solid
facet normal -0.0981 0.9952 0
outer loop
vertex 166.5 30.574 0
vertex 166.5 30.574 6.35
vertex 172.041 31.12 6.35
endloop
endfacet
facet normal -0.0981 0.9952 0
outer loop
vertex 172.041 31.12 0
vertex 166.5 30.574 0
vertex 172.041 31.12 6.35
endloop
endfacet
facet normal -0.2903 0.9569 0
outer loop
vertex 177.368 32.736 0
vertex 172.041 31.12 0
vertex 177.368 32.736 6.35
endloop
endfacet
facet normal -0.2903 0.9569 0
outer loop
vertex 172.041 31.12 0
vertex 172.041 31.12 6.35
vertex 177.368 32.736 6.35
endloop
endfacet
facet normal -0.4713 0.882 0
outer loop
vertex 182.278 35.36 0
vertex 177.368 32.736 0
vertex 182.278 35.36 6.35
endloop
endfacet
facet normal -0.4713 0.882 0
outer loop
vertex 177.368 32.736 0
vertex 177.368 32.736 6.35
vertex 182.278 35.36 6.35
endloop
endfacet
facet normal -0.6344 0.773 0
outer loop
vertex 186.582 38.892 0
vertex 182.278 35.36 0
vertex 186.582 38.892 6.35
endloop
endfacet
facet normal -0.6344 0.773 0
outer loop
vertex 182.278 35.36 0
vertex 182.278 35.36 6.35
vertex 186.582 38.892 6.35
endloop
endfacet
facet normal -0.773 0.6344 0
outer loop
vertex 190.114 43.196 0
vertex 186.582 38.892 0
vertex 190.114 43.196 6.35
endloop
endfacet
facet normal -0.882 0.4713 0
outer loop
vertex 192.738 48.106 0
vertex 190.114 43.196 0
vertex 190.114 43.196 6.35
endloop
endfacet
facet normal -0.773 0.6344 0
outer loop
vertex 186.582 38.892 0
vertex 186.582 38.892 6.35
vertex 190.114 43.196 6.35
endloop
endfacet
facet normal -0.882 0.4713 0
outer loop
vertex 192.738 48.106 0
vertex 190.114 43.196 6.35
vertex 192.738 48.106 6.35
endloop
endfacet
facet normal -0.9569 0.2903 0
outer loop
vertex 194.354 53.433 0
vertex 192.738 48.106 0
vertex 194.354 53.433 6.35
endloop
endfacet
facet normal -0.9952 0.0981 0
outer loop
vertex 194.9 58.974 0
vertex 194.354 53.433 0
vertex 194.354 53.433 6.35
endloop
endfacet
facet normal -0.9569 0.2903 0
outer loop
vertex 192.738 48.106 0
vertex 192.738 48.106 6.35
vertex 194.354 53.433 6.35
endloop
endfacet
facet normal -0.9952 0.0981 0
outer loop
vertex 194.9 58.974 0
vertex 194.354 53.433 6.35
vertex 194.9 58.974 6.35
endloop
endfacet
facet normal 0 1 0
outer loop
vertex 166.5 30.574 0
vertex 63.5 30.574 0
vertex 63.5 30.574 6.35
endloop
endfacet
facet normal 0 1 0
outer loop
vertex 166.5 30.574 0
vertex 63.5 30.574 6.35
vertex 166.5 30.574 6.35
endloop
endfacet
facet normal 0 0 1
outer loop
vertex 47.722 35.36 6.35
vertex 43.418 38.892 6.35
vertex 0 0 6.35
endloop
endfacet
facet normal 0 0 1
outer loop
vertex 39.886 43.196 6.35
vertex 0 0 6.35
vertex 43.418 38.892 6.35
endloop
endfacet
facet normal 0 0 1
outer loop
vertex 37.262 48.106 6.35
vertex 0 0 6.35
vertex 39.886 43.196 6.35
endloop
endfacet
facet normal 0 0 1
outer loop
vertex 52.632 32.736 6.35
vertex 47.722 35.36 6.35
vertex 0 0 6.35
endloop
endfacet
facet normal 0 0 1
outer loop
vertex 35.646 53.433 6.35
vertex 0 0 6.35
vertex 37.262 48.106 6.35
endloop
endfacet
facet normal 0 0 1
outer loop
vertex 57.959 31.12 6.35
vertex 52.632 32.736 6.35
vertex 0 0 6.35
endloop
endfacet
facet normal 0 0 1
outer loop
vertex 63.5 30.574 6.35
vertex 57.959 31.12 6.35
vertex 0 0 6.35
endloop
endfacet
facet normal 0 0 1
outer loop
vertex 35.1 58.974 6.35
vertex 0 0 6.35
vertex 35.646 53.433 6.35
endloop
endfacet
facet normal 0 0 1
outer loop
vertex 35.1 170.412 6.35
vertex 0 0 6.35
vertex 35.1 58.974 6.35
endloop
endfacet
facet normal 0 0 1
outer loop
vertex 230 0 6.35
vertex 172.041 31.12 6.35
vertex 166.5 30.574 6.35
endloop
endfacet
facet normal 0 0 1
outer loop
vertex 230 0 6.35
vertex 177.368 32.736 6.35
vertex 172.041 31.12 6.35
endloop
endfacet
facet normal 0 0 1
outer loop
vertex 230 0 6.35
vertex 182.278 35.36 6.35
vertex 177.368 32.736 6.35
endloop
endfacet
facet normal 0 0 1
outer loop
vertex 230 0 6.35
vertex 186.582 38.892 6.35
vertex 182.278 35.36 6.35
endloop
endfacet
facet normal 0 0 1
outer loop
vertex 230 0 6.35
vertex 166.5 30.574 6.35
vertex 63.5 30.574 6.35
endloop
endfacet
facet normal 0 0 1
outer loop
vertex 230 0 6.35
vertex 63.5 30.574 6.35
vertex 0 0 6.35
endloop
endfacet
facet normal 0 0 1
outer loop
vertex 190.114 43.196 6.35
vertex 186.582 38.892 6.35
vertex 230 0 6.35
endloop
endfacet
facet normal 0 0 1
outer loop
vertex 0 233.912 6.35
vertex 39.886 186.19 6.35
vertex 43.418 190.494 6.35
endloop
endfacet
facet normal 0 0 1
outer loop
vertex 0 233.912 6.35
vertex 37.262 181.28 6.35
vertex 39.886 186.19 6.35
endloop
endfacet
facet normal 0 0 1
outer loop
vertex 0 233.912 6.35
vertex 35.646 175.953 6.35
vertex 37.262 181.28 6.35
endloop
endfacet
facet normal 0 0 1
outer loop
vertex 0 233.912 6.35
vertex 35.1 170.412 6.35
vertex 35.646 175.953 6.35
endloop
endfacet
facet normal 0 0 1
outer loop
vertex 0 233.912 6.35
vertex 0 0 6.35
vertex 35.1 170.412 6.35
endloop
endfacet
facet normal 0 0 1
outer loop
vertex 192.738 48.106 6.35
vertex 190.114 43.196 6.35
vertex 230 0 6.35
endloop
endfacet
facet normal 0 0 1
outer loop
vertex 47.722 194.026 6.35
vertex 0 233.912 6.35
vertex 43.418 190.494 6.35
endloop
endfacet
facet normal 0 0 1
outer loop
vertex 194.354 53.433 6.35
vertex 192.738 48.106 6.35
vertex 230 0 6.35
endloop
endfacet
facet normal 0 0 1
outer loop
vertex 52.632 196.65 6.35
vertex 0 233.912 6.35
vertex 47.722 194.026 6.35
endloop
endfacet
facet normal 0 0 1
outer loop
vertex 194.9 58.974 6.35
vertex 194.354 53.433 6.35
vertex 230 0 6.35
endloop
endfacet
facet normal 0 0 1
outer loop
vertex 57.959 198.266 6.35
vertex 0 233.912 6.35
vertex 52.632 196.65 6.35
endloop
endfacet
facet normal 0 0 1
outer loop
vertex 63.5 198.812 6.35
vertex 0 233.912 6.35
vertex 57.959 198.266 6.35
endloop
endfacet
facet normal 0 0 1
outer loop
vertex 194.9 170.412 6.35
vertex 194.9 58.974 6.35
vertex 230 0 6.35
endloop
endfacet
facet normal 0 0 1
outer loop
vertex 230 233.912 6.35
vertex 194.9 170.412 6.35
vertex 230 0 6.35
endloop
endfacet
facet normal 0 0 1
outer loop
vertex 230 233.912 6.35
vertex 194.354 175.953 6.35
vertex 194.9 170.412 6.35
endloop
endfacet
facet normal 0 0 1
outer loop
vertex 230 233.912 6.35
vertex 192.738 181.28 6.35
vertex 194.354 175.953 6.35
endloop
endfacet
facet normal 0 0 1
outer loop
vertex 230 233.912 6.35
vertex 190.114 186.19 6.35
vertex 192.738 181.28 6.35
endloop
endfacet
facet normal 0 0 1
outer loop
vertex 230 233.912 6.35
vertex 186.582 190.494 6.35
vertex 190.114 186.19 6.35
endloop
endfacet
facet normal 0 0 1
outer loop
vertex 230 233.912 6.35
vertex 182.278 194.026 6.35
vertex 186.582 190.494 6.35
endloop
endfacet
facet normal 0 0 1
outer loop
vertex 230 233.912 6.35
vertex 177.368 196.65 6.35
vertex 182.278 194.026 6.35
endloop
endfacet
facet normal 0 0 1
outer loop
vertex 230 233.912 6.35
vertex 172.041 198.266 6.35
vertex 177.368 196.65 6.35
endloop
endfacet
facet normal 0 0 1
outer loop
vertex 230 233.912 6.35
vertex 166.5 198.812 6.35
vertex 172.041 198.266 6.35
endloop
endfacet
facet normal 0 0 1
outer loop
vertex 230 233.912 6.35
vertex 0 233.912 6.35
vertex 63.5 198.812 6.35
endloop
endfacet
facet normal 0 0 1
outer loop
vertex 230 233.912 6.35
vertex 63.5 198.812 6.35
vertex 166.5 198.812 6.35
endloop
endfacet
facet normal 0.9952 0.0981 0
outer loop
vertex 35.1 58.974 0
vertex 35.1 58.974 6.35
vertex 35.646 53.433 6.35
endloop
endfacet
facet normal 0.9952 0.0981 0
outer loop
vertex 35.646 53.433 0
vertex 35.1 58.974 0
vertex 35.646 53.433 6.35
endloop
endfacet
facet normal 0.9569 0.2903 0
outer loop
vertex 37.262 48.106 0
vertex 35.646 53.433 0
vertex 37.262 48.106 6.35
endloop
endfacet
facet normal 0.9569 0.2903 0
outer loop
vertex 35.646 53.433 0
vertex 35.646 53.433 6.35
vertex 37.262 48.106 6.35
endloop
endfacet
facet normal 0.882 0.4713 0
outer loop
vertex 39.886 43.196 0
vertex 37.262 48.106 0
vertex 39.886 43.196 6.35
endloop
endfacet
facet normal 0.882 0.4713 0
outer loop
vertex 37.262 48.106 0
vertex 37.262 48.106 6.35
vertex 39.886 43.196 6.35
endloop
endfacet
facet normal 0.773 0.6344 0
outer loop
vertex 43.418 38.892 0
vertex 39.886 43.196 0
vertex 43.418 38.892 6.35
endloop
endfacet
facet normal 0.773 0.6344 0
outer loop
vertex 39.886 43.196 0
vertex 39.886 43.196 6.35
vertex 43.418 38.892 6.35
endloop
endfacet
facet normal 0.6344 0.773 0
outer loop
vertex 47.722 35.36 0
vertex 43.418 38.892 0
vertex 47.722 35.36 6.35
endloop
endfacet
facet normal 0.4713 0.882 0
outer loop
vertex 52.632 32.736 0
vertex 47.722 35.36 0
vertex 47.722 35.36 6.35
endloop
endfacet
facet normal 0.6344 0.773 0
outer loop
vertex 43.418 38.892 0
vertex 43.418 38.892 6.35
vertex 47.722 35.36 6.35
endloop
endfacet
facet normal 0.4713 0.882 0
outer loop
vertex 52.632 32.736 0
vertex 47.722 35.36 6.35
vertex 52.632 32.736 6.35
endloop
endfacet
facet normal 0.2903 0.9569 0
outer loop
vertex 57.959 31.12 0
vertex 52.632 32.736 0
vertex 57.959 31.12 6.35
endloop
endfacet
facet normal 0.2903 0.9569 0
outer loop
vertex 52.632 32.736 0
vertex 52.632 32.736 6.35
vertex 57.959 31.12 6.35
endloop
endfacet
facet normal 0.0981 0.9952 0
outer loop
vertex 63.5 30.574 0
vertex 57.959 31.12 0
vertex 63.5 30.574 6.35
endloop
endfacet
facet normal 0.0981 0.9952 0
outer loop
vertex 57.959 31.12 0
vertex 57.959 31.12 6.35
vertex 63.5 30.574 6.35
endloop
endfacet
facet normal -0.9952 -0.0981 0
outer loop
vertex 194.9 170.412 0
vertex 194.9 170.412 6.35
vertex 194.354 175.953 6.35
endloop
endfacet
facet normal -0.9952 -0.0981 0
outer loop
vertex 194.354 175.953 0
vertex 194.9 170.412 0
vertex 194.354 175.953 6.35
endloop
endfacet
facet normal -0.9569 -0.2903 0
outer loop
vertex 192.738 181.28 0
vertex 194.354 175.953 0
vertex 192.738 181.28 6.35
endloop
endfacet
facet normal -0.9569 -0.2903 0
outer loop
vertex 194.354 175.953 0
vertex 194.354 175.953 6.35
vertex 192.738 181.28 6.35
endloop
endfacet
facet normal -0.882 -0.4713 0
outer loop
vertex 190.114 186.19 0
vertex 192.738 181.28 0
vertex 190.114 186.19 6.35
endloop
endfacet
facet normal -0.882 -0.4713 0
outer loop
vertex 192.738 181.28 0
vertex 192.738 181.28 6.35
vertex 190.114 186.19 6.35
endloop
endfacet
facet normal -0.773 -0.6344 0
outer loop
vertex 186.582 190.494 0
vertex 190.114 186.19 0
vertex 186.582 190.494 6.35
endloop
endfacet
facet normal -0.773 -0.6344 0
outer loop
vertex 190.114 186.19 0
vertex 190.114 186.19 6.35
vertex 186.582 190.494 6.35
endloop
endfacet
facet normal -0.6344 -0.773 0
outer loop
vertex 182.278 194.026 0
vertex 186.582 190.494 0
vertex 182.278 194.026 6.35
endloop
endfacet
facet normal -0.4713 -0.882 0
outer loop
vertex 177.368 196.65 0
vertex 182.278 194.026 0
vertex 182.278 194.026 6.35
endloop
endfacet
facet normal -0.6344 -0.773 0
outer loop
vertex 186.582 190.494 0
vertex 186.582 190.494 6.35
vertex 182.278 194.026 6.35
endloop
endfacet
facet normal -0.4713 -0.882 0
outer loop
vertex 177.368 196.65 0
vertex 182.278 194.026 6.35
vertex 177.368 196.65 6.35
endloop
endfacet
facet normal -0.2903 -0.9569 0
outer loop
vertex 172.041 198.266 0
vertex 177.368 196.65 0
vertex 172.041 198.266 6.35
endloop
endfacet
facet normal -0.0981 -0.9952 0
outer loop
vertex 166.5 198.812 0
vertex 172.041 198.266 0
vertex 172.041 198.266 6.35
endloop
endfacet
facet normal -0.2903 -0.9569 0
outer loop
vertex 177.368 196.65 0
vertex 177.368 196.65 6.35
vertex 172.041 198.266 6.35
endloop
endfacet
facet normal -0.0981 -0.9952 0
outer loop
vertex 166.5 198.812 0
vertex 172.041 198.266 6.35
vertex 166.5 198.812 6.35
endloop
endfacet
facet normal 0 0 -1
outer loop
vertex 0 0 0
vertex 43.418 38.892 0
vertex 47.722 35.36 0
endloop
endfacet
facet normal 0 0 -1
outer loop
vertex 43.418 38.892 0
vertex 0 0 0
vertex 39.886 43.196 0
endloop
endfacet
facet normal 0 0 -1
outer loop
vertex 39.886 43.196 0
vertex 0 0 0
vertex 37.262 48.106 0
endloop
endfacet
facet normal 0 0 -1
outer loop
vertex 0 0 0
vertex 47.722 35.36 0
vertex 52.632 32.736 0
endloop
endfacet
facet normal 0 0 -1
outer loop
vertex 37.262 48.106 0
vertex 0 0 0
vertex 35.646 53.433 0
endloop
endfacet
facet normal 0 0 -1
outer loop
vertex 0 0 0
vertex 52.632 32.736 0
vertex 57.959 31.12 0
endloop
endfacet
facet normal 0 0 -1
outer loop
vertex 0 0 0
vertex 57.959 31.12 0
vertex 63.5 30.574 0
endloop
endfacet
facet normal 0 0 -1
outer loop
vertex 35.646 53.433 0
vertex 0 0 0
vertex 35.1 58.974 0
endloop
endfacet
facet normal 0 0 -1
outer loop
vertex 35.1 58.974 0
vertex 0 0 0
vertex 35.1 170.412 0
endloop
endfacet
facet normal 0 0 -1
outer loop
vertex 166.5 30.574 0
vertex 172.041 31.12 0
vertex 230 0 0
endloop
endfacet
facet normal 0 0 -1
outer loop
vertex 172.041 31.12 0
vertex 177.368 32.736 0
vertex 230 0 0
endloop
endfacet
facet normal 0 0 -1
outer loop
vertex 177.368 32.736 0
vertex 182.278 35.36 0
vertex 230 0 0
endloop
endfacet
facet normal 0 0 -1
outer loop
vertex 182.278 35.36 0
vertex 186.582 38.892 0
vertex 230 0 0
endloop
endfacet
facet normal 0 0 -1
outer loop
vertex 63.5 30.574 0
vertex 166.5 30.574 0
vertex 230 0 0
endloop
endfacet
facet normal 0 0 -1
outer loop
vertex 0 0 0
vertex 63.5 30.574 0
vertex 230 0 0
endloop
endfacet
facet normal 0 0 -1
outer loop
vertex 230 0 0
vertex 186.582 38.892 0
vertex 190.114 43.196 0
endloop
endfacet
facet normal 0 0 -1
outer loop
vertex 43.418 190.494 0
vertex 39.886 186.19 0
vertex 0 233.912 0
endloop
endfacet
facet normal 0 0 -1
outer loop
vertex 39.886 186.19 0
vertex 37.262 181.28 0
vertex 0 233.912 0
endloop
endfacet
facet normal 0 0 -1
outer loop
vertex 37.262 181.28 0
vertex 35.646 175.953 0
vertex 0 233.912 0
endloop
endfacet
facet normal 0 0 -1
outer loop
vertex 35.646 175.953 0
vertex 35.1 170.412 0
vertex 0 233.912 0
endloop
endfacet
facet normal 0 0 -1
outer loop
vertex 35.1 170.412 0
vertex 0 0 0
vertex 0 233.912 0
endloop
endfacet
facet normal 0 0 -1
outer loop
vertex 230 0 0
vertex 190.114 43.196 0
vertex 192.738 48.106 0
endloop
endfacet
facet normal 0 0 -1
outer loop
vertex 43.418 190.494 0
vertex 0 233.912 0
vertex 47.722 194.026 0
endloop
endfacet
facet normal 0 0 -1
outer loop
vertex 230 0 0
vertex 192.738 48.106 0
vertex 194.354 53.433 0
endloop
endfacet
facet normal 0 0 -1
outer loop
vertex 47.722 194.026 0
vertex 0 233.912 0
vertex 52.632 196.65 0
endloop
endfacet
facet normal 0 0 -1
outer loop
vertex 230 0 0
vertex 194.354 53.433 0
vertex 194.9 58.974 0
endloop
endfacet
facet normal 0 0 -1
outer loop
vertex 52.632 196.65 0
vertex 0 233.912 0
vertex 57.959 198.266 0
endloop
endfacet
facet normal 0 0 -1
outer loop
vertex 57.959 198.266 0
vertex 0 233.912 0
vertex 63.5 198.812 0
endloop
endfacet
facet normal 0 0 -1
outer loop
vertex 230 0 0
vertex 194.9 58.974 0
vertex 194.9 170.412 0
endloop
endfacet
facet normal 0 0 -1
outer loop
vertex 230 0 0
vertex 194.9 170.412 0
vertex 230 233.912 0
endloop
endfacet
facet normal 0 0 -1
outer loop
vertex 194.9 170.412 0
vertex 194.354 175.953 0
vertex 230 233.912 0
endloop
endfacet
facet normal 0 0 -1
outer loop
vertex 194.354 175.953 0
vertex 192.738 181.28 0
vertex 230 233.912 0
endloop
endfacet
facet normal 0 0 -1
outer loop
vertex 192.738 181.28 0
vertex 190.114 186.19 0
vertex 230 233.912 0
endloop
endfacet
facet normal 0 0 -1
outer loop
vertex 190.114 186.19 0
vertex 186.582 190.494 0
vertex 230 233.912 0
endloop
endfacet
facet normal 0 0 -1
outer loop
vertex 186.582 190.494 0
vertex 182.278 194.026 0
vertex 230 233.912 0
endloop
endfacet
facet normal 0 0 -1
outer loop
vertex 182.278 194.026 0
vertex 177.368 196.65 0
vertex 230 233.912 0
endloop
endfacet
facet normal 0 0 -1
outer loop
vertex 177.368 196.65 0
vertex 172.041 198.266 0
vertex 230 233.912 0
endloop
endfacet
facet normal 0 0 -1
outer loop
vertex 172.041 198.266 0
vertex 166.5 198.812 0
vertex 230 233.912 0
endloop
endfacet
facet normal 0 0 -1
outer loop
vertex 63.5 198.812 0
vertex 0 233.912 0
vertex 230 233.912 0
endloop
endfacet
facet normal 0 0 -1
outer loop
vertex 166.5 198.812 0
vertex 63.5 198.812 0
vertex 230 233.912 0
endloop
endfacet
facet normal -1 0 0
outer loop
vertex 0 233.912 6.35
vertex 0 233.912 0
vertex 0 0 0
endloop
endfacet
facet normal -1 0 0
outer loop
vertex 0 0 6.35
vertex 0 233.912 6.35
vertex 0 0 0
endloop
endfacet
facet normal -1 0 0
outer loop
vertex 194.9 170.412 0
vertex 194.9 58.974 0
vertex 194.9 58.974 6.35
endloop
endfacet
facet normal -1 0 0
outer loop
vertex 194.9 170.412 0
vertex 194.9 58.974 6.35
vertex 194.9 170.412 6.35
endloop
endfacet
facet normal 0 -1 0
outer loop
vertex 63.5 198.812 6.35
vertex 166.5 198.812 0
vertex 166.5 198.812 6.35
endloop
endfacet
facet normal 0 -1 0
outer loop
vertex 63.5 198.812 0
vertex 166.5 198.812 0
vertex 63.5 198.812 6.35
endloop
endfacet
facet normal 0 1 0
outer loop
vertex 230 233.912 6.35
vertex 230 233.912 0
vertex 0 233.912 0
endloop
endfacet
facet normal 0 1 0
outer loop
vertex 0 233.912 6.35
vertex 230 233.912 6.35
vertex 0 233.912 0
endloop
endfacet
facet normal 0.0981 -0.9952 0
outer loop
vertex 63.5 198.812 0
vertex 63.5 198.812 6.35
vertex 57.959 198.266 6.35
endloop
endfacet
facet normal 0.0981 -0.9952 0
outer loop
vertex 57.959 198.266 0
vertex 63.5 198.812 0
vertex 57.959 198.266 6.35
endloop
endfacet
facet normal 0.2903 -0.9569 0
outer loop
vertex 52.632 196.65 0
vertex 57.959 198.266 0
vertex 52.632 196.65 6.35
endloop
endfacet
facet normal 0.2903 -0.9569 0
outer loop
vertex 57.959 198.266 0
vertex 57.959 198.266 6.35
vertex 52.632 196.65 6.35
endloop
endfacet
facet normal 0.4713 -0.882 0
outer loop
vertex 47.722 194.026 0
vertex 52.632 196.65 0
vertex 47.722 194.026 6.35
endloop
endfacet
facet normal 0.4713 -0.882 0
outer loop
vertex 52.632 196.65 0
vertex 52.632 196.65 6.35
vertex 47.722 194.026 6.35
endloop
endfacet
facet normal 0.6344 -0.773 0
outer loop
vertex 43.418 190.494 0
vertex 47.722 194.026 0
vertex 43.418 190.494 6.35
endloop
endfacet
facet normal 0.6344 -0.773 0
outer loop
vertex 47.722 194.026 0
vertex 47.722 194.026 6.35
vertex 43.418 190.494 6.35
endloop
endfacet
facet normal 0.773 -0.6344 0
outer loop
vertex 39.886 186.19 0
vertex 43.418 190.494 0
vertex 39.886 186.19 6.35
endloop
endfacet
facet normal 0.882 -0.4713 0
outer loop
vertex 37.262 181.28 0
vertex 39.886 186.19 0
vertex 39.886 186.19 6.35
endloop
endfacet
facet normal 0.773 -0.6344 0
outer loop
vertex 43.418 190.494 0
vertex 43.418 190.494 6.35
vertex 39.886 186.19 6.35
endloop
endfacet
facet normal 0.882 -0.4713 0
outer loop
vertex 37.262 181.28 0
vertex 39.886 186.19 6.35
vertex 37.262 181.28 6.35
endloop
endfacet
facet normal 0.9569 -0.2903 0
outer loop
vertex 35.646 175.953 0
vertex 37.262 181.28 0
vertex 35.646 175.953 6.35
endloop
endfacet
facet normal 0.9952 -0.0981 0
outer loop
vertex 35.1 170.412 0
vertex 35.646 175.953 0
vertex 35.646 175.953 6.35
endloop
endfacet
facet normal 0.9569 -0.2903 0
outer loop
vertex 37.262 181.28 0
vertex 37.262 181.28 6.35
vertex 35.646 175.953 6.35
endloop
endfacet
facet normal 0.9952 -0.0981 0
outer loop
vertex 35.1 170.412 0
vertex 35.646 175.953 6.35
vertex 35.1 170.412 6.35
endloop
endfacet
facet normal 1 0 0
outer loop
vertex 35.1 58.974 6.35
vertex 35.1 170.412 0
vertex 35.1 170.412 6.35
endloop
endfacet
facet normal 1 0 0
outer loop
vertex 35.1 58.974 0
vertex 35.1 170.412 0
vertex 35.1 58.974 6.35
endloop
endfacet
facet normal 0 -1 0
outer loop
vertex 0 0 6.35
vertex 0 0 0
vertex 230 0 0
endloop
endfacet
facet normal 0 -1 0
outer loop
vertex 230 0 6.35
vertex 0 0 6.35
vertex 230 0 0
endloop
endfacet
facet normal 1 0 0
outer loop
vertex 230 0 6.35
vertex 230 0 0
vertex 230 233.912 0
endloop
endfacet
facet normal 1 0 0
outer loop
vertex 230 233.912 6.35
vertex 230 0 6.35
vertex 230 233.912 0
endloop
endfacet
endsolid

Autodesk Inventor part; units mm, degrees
ref_plane "YZ Plane" through (0, 0, 0) normal (1, 0, 0) x (0, 1, 0)
ref_plane "XZ Plane" through (0, 0, 0) normal (0, 1, 0) x (-1, 0, 0)
ref_plane "XY Plane" through (0, 0, 0) normal (0, 0, 1) x (1, 0, 0)
sketch "Sketch1" plane through (0, 0, 0) normal (0, 0, 1) x (1, 0, 0)
  line L0 (0, 0) -> (230, 0)
  line L1 (230, 0) -> (230, 233.912)
  line L2 (230, 233.912) -> (0, 233.912)
  line L3 (0, 233.912) -> (0, 0)
  line L4 (38.1, 33.574) -> (191.9, 33.574)
  line L5 (191.9, 33.574) -> (191.9, 195.812)
  line L6 (191.9, 195.812) -> (38.1, 195.812)
  line L7 (38.1, 195.812) -> (38.1, 33.574)
  dimension "d0" = 230
  dimension "d1" = 233.912
  dimension "d2" = 33.574
  dimension "d3" = 38.1
  dimension "d4" = 38.1
  dimension "d5" = 38.1
extrude "Extrusion1" add sketch "Sketch1" along normal blind 6.35
fillet "Fillet3" radius 25.4 4 edges at (191.9, 33.574, 3.175) (38.1, 33.574, 3.175) (38.1, 195.812, 3.175) (191.9, 195.812, 3.175)
thicken "Thicken2" operation cut thickness 3 both sides no extend neighbours yes toward (0, 1, 0) faces at (97.8333, 195.812, 4.2333) (38.1, 96.12, 2.1167) (191.9, 133.266, 4.2333) (132.1667, 33.574, 4.2333) (183.7764, 189.0315, 2.1167) (39.8558, 179.6917, 2.1167) (180.8083, 37.9875, 2.1167) (61.6019, 33.645, 2.1167)
equation "\"d4\" = d3"
properties part number "Door Panel Front Foam" material "Polyurethane Foam"
